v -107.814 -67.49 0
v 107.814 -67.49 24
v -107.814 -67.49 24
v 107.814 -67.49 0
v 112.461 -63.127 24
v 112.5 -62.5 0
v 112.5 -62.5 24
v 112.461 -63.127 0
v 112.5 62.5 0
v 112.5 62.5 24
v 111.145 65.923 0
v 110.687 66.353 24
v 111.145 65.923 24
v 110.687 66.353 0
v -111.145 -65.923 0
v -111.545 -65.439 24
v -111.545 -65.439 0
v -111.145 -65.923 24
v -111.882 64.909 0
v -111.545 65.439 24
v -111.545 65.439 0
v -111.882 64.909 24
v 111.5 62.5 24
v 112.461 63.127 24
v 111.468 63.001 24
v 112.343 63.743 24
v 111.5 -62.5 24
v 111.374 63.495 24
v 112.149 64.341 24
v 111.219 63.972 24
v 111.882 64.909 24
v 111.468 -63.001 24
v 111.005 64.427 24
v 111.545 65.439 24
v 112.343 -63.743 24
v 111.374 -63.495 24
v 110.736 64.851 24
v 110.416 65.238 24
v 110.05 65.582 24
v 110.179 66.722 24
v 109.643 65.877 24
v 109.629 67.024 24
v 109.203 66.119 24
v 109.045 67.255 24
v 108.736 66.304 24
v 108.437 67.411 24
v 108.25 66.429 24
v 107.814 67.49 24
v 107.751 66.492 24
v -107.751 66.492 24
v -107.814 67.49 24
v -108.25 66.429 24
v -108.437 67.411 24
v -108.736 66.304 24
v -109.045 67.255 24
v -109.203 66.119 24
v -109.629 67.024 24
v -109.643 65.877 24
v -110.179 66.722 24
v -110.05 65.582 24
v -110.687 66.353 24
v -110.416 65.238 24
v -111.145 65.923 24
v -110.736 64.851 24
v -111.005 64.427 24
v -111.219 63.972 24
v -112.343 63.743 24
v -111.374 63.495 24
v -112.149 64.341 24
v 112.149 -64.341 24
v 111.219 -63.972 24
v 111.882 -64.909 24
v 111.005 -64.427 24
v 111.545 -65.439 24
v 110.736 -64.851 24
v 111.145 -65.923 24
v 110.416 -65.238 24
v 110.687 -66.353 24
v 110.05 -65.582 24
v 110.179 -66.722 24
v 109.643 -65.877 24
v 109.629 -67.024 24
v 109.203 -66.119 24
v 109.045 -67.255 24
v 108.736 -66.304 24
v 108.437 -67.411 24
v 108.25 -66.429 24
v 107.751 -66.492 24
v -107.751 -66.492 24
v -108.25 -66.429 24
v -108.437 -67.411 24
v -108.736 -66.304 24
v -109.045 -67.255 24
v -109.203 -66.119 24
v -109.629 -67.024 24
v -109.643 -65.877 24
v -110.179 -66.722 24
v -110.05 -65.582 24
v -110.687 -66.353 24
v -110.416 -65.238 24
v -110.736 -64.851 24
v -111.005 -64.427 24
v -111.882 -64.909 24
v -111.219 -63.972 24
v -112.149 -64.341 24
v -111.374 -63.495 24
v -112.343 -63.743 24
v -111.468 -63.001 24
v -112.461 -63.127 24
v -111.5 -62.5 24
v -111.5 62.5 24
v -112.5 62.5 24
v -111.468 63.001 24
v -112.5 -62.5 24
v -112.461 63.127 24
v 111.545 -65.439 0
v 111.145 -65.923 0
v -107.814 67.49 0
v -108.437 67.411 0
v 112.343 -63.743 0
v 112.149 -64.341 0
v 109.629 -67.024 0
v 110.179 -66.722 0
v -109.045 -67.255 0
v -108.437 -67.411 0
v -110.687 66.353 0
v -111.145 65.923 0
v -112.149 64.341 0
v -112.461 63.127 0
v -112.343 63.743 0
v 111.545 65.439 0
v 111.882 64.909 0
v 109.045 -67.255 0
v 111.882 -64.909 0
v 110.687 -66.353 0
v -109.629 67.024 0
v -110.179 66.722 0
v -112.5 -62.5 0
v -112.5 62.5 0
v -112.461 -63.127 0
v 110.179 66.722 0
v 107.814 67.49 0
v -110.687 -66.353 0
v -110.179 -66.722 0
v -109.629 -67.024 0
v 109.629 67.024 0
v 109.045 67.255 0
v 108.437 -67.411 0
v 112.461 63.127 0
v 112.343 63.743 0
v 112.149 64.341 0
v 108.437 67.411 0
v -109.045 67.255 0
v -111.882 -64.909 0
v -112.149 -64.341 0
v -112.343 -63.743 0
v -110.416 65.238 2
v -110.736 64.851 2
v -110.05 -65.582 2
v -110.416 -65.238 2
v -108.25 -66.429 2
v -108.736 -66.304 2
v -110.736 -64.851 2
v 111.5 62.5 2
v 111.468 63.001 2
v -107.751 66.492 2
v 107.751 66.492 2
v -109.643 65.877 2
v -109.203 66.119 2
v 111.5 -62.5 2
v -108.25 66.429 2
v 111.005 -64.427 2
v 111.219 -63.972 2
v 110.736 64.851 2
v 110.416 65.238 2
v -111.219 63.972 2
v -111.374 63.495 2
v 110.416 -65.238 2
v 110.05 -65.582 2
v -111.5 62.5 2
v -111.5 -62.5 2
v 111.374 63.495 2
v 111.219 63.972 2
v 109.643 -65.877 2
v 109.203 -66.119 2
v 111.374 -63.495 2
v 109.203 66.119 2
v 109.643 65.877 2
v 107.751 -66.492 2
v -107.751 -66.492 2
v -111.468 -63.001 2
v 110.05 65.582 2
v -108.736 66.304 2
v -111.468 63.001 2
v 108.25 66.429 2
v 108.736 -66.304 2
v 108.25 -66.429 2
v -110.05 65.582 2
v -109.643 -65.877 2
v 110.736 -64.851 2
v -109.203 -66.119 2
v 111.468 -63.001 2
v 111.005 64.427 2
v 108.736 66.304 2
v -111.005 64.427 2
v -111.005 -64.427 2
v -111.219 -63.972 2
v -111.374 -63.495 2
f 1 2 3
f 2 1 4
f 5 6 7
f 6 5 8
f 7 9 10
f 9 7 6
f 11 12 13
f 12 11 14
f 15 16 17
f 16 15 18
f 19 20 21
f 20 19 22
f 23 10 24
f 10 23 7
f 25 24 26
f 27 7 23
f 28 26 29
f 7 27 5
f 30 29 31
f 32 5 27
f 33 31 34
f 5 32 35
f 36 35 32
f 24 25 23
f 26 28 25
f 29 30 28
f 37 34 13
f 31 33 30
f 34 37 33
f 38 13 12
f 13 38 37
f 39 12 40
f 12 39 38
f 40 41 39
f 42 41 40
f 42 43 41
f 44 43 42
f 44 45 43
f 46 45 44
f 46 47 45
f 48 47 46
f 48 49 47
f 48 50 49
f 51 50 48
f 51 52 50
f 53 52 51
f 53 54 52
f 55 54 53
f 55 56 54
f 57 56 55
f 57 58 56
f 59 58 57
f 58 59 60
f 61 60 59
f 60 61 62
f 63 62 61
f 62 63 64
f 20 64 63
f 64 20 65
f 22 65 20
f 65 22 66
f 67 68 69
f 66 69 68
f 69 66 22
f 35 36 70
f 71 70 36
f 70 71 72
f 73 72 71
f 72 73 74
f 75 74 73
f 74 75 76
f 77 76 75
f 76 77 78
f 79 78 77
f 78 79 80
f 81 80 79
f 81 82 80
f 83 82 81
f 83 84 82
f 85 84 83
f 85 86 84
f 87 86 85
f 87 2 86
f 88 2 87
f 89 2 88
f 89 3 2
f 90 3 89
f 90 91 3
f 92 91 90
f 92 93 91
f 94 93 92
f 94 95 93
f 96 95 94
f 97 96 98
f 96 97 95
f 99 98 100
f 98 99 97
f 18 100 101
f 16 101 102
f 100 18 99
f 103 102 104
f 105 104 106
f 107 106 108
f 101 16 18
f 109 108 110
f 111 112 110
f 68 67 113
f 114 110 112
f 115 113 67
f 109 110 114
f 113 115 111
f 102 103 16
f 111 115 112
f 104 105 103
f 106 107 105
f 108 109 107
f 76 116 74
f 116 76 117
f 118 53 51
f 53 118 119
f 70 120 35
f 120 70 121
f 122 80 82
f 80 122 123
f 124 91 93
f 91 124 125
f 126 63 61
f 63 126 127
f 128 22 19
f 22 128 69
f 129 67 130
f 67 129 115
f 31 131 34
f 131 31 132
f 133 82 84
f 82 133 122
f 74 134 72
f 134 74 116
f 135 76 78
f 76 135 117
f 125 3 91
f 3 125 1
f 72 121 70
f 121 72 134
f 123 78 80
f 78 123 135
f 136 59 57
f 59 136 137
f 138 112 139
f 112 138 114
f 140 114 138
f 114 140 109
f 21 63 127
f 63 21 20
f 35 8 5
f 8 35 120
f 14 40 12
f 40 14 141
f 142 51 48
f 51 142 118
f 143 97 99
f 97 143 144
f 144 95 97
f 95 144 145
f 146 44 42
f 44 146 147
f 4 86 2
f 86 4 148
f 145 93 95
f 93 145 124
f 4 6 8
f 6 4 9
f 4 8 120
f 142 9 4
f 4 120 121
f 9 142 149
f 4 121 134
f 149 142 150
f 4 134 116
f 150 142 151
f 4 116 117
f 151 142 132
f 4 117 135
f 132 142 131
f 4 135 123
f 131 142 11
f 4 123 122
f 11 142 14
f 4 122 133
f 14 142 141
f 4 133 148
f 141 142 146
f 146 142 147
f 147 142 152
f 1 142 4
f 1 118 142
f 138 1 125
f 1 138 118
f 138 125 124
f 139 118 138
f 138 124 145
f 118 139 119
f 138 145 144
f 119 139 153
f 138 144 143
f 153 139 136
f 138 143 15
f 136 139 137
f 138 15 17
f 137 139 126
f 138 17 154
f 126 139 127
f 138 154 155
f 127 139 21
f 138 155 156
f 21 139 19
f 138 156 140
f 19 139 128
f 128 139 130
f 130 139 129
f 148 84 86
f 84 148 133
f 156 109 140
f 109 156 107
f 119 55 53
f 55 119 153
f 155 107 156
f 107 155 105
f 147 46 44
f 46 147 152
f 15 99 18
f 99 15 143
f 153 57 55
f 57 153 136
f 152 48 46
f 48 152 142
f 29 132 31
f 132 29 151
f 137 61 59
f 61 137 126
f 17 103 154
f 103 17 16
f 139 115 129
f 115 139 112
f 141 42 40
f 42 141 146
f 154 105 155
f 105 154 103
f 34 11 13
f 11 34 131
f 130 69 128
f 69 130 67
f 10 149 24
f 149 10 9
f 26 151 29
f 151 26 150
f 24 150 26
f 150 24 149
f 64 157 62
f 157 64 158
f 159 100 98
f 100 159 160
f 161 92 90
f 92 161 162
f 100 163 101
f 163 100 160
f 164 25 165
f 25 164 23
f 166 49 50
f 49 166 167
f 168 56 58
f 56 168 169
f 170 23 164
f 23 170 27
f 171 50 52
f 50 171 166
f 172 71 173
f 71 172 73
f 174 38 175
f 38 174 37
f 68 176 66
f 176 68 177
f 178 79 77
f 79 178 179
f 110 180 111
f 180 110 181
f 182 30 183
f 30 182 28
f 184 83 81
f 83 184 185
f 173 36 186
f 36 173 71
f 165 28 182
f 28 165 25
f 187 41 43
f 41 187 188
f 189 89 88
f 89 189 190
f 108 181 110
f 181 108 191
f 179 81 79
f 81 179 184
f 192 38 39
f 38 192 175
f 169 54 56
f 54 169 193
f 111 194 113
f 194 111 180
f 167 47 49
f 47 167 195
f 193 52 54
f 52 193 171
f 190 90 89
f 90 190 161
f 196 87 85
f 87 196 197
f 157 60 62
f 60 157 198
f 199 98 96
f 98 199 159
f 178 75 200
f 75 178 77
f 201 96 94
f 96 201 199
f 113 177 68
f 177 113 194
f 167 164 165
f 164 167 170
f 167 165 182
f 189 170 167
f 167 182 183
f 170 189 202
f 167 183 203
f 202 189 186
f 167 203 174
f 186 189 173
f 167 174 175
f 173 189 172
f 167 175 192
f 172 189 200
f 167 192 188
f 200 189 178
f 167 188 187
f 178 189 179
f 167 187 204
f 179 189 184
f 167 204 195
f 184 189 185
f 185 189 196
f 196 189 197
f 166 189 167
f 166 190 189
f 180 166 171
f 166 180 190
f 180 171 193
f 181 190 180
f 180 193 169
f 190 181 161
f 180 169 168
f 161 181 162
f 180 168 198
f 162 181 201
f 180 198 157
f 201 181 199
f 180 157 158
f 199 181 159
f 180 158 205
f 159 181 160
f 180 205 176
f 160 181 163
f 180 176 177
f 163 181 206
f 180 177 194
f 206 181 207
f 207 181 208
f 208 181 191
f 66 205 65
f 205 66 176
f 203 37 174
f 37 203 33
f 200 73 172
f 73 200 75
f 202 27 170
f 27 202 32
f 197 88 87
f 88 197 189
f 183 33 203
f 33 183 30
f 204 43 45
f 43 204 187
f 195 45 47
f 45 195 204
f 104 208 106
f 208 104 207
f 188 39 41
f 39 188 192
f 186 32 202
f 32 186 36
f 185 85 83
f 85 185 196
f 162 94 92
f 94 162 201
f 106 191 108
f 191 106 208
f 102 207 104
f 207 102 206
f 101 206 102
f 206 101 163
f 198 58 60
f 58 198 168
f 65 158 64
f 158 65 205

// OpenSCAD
$fn = 50;


difference() {
	union() {
		hull() {
			translate(v = [-107.5000000000, 62.5000000000, 0]) {
				cylinder(h = 24, r = 5);
			}
			translate(v = [107.5000000000, 62.5000000000, 0]) {
				cylinder(h = 24, r = 5);
			}
			translate(v = [-107.5000000000, -62.5000000000, 0]) {
				cylinder(h = 24, r = 5);
			}
			translate(v = [107.5000000000, -62.5000000000, 0]) {
				cylinder(h = 24, r = 5);
			}
		}
	}
	union() {
		translate(v = [0, 0, 2]) {
			hull() {
				translate(v = [-107.5000000000, 62.5000000000, 0]) {
					cylinder(h = 22, r = 4);
				}
				translate(v = [107.5000000000, 62.5000000000, 0]) {
					cylinder(h = 22, r = 4);
				}
				translate(v = [-107.5000000000, -62.5000000000, 0]) {
					cylinder(h = 22, r = 4);
				}
				translate(v = [107.5000000000, -62.5000000000, 0]) {
					cylinder(h = 22, r = 4);
				}
			}
		}
	}
}
